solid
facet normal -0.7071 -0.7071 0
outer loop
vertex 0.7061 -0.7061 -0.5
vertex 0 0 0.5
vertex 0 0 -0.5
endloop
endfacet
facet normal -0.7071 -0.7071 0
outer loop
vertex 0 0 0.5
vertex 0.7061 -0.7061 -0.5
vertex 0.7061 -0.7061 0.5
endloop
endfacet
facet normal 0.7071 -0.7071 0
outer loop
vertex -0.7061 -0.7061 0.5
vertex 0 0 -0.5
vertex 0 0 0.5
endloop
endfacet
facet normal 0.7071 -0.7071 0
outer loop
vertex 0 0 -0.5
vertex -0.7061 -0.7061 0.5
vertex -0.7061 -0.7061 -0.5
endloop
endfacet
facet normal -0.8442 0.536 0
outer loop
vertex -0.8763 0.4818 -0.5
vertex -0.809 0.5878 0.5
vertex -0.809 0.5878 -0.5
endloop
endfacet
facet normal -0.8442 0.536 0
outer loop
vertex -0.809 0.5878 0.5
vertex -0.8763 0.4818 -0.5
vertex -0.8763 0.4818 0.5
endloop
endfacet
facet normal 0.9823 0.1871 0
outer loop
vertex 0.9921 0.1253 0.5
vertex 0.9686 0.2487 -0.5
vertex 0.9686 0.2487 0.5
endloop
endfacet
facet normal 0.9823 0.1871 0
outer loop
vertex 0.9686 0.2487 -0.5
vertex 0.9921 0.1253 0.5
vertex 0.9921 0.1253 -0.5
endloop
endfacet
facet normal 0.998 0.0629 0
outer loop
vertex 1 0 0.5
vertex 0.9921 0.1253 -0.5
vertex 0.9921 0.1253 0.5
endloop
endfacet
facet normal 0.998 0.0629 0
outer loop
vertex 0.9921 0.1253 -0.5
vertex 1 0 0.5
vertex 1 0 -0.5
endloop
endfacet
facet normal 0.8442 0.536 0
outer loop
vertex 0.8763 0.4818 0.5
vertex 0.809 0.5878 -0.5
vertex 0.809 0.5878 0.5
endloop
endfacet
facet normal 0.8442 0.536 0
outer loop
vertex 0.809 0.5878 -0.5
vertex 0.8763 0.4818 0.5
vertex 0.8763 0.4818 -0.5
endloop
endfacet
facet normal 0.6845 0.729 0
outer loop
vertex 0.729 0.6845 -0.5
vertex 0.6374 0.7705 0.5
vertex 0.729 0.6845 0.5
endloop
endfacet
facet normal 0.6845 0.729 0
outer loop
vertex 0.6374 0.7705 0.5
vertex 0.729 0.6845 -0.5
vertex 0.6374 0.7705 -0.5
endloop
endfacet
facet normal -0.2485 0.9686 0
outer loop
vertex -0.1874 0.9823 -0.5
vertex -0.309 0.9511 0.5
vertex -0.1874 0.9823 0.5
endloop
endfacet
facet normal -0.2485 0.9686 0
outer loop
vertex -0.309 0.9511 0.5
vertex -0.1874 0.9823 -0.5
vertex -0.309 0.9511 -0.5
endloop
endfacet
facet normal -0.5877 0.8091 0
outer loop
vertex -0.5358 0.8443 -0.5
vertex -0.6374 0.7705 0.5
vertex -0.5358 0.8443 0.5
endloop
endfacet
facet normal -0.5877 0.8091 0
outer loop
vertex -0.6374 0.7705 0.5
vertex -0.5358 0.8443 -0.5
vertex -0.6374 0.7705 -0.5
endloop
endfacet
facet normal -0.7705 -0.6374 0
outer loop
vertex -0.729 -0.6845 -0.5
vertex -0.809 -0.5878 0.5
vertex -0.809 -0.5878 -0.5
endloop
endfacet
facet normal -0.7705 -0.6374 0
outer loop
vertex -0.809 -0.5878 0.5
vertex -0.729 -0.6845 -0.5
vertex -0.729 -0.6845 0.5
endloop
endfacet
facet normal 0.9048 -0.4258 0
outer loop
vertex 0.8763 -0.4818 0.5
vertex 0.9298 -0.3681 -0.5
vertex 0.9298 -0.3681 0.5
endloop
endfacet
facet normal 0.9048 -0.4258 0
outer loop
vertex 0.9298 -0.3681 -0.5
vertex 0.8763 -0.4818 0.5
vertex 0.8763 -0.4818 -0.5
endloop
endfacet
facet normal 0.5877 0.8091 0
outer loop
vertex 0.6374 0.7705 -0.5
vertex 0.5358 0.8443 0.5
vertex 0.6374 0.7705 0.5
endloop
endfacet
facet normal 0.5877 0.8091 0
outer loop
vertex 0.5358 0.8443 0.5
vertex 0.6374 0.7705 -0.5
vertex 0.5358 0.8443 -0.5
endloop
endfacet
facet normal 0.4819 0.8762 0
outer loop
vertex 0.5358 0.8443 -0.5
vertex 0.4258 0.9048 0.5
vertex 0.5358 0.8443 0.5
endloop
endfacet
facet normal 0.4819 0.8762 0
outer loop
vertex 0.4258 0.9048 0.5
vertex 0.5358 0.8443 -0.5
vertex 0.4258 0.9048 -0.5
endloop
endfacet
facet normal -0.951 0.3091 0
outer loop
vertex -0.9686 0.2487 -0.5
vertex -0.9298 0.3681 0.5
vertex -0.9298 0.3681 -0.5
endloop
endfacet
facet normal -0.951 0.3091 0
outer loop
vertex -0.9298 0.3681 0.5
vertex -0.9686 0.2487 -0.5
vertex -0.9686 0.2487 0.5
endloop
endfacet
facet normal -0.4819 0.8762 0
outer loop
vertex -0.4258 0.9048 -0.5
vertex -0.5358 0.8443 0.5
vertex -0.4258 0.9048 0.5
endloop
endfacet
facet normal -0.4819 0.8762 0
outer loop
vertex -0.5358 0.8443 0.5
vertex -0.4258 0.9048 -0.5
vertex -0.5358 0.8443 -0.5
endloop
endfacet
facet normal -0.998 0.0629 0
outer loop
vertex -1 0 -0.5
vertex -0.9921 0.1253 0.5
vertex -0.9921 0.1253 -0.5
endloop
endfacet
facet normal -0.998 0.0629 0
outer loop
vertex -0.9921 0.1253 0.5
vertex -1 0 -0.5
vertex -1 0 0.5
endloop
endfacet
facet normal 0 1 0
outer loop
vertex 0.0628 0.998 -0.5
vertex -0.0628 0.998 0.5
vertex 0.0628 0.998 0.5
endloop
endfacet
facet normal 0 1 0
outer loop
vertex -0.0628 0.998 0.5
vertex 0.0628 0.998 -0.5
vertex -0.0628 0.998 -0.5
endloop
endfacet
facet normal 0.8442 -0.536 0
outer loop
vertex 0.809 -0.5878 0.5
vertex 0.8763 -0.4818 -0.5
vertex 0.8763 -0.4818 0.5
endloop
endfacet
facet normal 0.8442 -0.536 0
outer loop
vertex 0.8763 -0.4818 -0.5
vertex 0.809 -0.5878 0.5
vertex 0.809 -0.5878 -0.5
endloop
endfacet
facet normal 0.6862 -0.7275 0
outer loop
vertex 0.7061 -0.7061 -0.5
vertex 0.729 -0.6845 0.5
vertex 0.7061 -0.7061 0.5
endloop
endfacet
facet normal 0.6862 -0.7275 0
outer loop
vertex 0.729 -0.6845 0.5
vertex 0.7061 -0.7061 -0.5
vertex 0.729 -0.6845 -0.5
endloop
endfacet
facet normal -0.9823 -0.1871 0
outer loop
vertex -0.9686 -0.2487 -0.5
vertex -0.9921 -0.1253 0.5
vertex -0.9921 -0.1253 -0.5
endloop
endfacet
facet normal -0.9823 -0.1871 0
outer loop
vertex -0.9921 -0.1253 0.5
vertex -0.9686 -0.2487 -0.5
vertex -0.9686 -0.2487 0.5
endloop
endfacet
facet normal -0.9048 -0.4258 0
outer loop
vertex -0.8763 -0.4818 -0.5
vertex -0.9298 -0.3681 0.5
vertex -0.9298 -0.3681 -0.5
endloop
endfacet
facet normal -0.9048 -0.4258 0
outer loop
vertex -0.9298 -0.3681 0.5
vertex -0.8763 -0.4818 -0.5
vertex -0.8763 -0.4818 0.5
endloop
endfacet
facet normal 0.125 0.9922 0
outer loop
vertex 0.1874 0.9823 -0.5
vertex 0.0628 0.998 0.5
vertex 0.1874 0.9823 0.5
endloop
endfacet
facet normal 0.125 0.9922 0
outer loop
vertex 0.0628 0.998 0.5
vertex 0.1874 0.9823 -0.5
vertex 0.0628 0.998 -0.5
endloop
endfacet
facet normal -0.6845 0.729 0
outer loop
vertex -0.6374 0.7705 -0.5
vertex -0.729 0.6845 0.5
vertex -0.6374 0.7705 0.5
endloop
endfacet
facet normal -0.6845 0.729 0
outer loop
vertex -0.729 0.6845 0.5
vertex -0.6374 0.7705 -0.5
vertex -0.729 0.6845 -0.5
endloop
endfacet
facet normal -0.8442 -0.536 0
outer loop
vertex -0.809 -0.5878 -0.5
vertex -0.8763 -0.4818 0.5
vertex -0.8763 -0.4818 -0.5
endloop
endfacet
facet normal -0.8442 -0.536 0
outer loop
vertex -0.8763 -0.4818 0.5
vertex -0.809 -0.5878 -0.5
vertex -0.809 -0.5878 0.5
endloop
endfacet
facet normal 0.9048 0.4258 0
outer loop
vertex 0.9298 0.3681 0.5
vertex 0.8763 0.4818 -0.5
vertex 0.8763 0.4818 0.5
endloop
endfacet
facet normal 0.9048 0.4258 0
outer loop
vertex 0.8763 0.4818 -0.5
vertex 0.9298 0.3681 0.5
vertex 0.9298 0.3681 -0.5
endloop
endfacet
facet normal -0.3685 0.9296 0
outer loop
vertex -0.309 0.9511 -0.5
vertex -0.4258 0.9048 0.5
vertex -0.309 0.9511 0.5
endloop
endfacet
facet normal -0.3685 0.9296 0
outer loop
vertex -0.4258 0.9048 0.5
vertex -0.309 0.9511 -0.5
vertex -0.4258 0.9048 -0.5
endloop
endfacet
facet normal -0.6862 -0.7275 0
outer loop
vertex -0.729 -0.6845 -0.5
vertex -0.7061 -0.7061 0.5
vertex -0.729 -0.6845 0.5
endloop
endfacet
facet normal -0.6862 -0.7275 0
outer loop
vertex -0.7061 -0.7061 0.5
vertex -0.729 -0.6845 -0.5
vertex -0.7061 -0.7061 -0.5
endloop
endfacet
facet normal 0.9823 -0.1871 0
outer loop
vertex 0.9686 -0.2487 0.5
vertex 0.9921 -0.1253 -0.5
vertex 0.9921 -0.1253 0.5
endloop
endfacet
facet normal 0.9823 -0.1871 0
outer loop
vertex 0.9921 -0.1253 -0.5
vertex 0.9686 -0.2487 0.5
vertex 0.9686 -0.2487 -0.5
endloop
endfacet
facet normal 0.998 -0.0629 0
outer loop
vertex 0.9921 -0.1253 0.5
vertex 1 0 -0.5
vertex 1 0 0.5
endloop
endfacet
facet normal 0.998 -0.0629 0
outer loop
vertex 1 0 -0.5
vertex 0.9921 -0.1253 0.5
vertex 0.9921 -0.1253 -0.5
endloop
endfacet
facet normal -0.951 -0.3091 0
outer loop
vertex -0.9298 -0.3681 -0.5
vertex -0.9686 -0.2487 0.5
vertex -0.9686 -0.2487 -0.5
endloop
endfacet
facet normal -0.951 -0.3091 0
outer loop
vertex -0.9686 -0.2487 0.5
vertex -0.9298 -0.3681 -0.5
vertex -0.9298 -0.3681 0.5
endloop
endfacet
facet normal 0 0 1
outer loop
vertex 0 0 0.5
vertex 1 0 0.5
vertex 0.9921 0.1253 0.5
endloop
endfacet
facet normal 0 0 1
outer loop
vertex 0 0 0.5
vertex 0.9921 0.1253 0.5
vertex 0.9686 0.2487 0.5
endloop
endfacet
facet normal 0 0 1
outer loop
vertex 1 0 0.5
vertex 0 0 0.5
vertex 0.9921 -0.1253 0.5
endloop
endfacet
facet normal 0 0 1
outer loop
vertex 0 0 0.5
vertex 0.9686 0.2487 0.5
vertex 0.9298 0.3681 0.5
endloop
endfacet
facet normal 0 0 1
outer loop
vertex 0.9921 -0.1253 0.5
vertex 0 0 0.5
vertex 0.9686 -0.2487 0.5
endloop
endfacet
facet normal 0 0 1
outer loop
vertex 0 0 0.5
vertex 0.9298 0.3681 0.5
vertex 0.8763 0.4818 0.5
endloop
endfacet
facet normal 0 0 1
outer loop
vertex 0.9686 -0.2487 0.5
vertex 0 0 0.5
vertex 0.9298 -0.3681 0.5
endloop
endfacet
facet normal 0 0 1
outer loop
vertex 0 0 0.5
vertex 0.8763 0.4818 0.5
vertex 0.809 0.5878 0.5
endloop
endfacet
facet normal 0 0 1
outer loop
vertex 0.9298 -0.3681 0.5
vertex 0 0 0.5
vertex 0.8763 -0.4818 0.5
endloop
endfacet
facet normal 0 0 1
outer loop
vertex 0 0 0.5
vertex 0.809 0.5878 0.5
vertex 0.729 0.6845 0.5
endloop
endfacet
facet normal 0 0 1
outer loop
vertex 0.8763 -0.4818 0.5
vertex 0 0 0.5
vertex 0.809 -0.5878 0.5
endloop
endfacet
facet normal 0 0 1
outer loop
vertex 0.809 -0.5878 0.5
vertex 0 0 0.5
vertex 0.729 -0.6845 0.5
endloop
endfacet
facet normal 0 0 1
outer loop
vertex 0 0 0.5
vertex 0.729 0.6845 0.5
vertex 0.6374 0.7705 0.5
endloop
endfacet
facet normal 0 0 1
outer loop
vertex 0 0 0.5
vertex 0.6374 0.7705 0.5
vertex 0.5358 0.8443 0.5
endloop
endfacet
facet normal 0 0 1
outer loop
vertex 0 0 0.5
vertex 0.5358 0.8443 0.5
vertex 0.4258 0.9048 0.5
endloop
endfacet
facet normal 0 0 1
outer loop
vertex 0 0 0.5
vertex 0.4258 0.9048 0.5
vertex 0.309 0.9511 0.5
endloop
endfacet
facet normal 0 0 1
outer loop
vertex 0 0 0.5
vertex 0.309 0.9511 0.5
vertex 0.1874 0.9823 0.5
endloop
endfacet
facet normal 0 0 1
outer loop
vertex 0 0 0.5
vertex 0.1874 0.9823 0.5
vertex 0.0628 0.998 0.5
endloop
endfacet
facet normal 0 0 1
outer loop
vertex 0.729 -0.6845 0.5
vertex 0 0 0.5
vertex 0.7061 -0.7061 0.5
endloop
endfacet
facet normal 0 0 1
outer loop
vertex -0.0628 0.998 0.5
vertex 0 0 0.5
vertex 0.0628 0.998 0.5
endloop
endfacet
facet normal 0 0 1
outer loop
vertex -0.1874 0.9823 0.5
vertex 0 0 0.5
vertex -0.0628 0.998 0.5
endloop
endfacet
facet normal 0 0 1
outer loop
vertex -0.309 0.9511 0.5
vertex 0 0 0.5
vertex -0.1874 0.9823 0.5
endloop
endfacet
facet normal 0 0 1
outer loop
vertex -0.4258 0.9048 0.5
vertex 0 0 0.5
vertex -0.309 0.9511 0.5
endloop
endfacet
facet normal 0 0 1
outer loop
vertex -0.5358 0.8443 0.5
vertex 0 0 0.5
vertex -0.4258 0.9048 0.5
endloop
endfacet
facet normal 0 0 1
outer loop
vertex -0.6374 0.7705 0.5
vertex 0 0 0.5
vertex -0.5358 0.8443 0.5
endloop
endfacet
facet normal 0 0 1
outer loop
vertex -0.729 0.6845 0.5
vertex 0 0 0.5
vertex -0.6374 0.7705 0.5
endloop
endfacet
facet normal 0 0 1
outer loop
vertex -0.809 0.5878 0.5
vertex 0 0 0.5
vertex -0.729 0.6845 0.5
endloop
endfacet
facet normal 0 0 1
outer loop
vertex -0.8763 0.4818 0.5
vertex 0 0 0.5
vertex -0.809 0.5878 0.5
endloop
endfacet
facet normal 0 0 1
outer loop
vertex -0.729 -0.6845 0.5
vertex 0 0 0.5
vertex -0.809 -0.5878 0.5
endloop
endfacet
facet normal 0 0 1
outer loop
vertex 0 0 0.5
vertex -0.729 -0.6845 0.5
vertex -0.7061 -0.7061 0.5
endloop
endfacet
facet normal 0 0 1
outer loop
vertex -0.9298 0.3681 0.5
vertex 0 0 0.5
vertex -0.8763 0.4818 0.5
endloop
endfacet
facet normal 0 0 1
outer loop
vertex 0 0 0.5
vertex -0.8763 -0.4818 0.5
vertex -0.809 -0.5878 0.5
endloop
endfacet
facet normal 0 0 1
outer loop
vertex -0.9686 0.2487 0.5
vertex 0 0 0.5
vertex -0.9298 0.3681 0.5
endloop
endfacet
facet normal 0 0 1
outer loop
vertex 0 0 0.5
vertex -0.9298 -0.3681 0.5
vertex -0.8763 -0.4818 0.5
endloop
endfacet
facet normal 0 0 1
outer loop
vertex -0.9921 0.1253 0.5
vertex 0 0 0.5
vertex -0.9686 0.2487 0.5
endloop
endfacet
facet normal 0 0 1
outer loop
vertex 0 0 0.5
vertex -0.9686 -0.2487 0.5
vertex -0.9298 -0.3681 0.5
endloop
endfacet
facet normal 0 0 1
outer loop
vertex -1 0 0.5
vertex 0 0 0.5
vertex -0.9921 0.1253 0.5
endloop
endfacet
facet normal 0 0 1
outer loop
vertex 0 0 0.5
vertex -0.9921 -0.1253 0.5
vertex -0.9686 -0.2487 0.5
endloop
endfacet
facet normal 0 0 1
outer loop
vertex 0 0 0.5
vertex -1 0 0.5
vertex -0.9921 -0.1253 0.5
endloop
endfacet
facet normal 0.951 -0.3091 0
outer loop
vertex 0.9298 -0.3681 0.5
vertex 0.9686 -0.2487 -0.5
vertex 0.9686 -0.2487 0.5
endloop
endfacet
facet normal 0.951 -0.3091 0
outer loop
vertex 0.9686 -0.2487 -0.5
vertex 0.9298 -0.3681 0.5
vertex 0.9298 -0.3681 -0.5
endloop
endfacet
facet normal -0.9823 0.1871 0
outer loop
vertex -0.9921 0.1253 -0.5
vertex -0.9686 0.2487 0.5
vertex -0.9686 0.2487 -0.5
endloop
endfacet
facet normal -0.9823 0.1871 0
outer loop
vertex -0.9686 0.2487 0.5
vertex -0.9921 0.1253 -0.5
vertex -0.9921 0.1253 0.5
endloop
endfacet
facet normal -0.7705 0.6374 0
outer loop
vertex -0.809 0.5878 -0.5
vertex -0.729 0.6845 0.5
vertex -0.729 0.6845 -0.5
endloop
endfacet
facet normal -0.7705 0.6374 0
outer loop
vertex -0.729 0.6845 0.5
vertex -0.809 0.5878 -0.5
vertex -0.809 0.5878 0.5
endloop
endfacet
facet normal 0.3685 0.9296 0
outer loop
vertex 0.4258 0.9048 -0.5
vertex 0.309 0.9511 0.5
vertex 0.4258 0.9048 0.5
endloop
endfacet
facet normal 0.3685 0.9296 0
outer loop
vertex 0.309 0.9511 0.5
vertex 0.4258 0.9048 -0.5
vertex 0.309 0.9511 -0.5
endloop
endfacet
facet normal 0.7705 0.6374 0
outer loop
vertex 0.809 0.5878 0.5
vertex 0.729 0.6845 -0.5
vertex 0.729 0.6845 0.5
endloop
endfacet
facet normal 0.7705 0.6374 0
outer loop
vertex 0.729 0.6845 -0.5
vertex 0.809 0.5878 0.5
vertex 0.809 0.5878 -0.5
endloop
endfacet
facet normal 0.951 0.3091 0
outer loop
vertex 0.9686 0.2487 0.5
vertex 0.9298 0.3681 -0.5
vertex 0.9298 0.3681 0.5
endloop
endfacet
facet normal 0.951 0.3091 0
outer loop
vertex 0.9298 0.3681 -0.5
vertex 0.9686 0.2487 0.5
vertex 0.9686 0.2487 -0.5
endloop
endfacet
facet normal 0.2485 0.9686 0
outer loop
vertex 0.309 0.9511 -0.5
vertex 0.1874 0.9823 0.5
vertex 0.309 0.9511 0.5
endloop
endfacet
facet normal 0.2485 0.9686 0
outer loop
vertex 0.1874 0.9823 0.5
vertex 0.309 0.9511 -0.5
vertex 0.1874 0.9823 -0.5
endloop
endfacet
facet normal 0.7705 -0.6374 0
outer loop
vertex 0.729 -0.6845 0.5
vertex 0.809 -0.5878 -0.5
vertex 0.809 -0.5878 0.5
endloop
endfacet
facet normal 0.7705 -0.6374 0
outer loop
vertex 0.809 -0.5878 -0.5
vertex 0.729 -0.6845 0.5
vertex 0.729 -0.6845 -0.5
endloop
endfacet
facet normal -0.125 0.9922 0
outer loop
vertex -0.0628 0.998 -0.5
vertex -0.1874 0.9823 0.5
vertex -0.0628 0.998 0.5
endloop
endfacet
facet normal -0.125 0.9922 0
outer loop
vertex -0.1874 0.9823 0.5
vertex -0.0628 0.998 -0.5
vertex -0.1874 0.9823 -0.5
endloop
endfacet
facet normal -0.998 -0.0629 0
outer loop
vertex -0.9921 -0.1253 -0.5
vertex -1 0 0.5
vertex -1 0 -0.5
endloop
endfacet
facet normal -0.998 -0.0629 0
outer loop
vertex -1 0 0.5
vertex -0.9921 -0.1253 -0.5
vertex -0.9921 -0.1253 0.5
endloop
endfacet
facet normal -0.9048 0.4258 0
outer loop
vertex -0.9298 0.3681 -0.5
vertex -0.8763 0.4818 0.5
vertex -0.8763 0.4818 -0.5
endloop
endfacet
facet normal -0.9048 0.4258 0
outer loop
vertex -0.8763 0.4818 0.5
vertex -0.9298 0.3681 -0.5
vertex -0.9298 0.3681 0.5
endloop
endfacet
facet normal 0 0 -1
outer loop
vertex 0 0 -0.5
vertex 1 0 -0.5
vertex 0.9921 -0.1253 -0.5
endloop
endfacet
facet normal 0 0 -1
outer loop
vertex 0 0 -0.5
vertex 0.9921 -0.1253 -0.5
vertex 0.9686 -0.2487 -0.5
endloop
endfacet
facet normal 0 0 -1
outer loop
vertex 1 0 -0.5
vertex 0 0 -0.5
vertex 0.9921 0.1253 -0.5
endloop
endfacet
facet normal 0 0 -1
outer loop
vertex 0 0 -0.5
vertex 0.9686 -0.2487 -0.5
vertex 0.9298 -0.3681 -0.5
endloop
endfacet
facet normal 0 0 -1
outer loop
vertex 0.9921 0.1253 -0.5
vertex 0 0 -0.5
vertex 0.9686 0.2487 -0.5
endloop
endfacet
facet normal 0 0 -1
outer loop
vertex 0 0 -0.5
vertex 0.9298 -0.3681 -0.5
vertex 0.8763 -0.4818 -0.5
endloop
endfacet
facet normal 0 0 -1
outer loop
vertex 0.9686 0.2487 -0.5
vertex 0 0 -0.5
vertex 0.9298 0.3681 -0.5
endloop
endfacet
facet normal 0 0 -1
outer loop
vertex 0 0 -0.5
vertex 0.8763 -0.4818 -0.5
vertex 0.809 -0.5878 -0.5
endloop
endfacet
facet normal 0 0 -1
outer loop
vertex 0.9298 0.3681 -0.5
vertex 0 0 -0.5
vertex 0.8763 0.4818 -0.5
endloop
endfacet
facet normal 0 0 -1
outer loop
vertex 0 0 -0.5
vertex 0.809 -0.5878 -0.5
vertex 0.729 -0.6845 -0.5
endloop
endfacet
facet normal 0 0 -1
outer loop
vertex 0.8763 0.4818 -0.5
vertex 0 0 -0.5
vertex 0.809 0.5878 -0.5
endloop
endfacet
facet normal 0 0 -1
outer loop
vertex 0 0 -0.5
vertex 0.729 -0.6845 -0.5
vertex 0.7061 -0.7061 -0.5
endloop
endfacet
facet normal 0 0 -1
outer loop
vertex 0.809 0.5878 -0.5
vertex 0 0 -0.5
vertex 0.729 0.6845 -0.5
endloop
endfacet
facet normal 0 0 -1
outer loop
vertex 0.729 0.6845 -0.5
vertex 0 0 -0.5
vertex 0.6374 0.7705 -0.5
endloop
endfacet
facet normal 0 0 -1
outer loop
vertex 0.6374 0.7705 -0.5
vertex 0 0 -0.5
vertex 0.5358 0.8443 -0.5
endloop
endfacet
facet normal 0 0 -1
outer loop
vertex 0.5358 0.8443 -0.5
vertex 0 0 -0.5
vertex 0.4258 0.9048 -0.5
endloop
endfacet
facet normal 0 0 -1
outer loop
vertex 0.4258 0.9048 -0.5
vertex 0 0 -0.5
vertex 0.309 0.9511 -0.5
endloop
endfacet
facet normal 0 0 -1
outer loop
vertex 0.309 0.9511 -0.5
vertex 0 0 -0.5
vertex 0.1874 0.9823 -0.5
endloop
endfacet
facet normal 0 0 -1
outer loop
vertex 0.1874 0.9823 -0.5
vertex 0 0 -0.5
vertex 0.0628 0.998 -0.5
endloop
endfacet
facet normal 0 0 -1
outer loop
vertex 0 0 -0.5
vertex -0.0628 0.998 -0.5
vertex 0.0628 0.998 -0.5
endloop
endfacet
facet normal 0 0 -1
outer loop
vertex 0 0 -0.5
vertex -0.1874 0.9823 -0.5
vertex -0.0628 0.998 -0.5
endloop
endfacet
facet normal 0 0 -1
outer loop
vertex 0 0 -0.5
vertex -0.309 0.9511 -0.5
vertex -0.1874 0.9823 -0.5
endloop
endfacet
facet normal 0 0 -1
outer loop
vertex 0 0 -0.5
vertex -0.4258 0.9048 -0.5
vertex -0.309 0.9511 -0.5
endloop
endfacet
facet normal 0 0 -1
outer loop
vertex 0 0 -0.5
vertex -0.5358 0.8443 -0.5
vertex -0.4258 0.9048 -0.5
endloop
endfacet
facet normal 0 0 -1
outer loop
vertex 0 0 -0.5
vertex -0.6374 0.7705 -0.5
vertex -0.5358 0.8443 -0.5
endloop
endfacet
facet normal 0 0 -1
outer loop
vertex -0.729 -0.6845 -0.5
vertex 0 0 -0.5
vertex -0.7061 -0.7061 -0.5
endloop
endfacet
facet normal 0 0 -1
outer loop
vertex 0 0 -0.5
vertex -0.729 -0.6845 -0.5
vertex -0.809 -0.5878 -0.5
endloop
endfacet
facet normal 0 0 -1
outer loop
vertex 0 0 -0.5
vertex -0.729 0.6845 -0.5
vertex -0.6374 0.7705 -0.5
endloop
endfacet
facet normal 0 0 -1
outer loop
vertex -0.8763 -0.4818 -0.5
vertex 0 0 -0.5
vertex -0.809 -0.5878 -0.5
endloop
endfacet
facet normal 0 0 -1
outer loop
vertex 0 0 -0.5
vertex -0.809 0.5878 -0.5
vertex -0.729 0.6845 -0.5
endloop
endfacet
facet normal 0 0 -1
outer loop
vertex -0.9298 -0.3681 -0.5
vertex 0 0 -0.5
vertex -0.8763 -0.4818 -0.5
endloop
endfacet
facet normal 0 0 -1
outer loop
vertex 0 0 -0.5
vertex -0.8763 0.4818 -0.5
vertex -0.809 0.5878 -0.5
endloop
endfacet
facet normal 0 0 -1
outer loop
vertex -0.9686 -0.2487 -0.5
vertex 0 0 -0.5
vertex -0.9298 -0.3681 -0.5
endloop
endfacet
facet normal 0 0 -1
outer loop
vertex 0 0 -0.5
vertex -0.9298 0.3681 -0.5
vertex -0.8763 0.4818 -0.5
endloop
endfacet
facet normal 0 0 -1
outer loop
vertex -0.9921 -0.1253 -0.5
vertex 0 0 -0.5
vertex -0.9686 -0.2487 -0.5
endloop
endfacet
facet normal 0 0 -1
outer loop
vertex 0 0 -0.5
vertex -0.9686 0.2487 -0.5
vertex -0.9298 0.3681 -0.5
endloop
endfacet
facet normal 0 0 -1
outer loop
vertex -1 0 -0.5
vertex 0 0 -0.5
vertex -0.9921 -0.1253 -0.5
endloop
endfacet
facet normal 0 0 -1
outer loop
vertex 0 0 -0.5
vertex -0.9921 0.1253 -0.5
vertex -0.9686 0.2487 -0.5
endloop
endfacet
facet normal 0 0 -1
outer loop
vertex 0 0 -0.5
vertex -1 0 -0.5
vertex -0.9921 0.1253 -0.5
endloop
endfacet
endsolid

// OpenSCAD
// Copyright 2013 Jonathan Hulka
// This program is free software; you can redistribute it and/or modify
// it under the terms of the GNU General Public License as published by
// the Free Software Foundation; either version 2 of the License, or
// (at your option) any later version.
// 
// This program is distributed in the hope that it will be useful,
// but WITHOUT ANY WARRANTY; without even the implied warranty of
// MERCHANTABILITY or FITNESS FOR A PARTICULAR PURPOSE.  See the
// GNU General Public License for more details.
// 
// You should have received a copy of the GNU General Public License
// along with this program; if not, write to the Free Software
// Foundation, Inc., 51 Franklin Street, Fifth Floor, Boston,
// MA 02110-1301, USA.


//Creates a wedge-shaped section of a cylinder
//The result is centered with the open part of the wedge facing in the positive y direction
//h - height
//r - radius
//a - angle
//$fn=100;
module wedge(h, r, a, $fn=50)
{
    th=(a%360)/2;
    difference()
    {
        cylinder(h=h,r=r,center=true, $fn=$fn);
        if(th<90)
        {
            for(n=[-1,1])rotate(-th*n)translate([(r+0.5)*n,0,0])
                cube(size=[r*2+1,r*2+1,h+1],center=true);
        }
        else
        {
            intersection()
            {
                rotate(-th)translate([(r+0.5),(r+0.5),0])
                    cube(size=[r*2+1,r*2+1,h+1],center=true);
                rotate(th)translate([-(r+0.5),(r+0.5),0])
                    cube(size=[r*2+1,r*2+1,h+1],center=true);
            }
        }
    }
}

echo("Please 'use' this library, wedge.scad and don't 'include' it unless you");
echo("want all the test artifacts below ;)");

wedge(h=1, r=1, a=270);
